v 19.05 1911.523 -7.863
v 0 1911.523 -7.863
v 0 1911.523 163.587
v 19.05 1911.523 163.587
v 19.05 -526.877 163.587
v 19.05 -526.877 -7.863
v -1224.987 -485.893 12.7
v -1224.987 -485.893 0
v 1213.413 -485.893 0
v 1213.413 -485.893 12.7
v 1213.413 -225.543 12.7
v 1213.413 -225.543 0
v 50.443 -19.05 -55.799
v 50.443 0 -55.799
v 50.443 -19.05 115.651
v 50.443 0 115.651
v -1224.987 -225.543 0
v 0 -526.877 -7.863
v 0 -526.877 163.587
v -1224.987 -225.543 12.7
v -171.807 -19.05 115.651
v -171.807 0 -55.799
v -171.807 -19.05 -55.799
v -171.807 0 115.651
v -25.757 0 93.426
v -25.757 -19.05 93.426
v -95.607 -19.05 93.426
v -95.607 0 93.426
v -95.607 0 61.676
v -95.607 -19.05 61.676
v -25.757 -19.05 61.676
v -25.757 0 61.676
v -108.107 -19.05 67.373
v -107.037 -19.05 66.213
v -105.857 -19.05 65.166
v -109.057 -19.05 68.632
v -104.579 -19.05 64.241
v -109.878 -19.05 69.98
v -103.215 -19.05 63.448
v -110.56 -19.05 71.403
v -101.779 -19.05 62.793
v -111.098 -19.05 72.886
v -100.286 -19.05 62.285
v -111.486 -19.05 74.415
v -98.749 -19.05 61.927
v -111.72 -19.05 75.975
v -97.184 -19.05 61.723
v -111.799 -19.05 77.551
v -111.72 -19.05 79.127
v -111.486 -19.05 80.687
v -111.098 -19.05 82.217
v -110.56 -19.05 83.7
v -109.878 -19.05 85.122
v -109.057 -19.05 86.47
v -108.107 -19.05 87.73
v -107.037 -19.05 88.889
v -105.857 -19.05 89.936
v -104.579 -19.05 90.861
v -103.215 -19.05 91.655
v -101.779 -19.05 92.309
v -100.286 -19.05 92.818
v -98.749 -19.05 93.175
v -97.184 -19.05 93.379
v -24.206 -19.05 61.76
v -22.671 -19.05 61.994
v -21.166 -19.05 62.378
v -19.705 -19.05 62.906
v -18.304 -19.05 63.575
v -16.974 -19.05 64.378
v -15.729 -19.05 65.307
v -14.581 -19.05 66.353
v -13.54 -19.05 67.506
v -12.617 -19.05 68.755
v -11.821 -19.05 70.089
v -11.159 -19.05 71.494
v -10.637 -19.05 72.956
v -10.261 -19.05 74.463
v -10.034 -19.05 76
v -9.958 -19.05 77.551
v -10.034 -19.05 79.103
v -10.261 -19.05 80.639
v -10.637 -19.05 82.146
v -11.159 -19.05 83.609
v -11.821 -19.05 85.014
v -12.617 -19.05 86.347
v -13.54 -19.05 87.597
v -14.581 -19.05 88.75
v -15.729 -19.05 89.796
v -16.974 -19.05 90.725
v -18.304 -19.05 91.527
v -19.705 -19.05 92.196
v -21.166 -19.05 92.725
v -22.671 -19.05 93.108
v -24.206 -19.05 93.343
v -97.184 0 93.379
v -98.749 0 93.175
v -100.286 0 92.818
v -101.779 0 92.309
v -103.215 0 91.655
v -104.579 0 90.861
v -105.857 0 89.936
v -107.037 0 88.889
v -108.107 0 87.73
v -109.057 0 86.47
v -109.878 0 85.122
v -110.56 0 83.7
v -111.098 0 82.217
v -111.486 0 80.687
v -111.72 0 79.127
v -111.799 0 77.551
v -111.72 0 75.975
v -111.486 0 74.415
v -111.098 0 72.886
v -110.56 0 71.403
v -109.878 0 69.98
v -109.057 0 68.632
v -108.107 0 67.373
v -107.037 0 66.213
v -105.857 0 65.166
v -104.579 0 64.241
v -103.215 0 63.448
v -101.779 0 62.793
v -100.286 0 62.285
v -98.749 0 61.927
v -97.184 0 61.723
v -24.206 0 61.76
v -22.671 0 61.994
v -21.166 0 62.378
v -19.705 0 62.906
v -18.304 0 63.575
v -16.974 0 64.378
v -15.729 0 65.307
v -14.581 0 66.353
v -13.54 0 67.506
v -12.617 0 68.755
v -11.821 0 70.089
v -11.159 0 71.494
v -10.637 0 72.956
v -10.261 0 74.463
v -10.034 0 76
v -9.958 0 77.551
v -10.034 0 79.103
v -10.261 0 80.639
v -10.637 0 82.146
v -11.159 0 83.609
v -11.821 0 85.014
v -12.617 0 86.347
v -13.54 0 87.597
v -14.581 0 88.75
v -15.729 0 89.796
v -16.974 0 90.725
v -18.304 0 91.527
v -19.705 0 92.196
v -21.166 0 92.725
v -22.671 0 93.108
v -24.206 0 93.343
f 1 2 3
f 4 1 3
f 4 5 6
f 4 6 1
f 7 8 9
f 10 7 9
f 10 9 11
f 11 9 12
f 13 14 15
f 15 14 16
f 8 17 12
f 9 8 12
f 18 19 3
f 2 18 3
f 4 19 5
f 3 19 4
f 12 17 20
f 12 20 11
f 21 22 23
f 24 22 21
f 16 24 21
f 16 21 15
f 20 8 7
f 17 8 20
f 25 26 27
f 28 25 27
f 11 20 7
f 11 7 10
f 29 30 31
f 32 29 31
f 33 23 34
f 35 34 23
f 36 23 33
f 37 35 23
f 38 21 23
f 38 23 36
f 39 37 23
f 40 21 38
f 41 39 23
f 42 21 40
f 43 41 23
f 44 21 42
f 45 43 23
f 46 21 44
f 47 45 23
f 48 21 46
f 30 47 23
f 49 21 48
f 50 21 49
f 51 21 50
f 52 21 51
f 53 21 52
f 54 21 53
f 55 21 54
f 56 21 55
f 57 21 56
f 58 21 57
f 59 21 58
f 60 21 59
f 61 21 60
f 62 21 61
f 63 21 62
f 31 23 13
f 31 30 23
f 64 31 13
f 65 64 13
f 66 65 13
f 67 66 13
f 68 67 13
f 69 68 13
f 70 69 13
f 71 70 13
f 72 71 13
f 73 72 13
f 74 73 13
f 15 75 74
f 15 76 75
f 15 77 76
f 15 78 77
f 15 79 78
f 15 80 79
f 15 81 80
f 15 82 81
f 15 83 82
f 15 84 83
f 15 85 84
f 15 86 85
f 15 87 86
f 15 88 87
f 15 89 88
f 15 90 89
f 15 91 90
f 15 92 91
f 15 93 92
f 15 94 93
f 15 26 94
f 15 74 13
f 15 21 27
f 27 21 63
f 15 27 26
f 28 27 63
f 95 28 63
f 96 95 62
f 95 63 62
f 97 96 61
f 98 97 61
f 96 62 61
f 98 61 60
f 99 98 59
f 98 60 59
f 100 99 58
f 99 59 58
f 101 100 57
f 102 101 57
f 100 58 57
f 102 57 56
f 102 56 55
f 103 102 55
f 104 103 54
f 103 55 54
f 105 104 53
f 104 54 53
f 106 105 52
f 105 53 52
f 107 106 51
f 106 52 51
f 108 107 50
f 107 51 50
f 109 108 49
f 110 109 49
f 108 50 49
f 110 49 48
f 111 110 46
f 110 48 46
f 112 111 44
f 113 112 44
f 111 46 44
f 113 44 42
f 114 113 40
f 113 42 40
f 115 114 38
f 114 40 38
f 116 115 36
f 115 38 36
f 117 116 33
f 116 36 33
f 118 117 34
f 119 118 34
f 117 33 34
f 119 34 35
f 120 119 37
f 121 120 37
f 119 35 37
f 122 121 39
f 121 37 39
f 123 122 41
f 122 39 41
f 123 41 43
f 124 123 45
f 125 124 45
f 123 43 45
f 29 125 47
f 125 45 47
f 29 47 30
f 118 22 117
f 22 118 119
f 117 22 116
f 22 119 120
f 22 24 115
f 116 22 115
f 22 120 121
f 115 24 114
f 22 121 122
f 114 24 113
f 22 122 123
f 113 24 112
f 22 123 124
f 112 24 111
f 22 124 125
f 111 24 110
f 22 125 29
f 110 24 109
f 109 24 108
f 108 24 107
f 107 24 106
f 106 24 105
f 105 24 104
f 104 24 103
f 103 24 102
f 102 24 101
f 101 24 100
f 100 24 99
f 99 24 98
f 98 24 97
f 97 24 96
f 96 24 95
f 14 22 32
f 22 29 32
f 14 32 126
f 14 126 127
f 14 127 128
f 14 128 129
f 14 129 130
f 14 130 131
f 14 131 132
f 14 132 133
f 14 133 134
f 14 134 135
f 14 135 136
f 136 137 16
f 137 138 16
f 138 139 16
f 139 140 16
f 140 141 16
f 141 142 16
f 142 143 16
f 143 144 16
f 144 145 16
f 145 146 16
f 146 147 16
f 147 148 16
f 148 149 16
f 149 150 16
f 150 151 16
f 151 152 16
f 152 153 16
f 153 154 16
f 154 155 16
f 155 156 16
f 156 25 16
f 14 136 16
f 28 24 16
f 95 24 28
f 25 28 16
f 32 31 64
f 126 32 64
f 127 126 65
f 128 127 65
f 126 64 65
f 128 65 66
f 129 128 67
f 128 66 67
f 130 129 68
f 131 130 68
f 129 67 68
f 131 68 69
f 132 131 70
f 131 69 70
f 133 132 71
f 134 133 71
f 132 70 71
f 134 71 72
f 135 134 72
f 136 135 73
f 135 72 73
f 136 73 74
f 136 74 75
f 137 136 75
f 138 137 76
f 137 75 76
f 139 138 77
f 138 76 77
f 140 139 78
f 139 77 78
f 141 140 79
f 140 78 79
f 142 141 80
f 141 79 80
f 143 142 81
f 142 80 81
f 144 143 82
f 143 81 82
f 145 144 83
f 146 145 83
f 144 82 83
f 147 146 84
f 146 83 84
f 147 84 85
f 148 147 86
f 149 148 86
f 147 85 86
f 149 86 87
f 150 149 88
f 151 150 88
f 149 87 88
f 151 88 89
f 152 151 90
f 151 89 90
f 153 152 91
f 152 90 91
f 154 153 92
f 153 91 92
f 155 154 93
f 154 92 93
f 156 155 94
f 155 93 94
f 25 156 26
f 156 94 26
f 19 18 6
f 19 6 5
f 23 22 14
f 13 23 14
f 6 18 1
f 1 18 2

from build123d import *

# Parameters (mm, degrees)
F0_W     = 222.25
F0_H     = 171.45
F1_DEPTH = 19.05
F3_DEPTH = 19.05
F4_W     = 2438.4
F4_H     = 171.45
F5_DEPTH = 19.05
F6_W     = 2438.4
F6_H     = 260.35
F7_DEPTH = 12.7


with BuildPart() as f1:
    # F0 (on Front) → F1 (new body)
    with BuildSketch(Plane.XZ):
        with Locations((-60.682219, 29.926221)):
            Rectangle(F0_W, F0_H)
    extrude(amount=F1_DEPTH)

    # F2 (on face) → F3 (cut)
    with BuildSketch(Plane.XZ.offset(19.05)):
        with BuildLine():
            Line((-25.757219, 93.426221), (-95.607219, 93.426221))
            ThreePointArc((-95.607219, 93.426221), (-111.798823, 77.551221), (-95.607219, 61.676221))
            Line((-95.607219, 61.676221), (-25.757219, 61.676221))
            ThreePointArc((-25.757219, 61.676221), (-9.957713, 77.551221), (-25.757219, 93.426221))
        make_face()
    extrude(amount=-F3_DEPTH, mode=Mode.SUBTRACT)


with BuildPart() as f5:
    # F4 (on Right) → F5 (new body)
    with BuildSketch(Plane.YZ):
        with Locations((692.322745, 77.862317)):
            Rectangle(F4_W, F4_H)
    extrude(amount=F5_DEPTH)


with BuildPart() as f7:
    # F6 (on Top) → F7 (new body)
    with BuildSketch(Plane.XY):
        with Locations((-5.786661, -355.718326)):
            Rectangle(F6_W, F6_H)
    extrude(amount=F7_DEPTH)


solid = Compound([f1.part, f5.part, f7.part])
